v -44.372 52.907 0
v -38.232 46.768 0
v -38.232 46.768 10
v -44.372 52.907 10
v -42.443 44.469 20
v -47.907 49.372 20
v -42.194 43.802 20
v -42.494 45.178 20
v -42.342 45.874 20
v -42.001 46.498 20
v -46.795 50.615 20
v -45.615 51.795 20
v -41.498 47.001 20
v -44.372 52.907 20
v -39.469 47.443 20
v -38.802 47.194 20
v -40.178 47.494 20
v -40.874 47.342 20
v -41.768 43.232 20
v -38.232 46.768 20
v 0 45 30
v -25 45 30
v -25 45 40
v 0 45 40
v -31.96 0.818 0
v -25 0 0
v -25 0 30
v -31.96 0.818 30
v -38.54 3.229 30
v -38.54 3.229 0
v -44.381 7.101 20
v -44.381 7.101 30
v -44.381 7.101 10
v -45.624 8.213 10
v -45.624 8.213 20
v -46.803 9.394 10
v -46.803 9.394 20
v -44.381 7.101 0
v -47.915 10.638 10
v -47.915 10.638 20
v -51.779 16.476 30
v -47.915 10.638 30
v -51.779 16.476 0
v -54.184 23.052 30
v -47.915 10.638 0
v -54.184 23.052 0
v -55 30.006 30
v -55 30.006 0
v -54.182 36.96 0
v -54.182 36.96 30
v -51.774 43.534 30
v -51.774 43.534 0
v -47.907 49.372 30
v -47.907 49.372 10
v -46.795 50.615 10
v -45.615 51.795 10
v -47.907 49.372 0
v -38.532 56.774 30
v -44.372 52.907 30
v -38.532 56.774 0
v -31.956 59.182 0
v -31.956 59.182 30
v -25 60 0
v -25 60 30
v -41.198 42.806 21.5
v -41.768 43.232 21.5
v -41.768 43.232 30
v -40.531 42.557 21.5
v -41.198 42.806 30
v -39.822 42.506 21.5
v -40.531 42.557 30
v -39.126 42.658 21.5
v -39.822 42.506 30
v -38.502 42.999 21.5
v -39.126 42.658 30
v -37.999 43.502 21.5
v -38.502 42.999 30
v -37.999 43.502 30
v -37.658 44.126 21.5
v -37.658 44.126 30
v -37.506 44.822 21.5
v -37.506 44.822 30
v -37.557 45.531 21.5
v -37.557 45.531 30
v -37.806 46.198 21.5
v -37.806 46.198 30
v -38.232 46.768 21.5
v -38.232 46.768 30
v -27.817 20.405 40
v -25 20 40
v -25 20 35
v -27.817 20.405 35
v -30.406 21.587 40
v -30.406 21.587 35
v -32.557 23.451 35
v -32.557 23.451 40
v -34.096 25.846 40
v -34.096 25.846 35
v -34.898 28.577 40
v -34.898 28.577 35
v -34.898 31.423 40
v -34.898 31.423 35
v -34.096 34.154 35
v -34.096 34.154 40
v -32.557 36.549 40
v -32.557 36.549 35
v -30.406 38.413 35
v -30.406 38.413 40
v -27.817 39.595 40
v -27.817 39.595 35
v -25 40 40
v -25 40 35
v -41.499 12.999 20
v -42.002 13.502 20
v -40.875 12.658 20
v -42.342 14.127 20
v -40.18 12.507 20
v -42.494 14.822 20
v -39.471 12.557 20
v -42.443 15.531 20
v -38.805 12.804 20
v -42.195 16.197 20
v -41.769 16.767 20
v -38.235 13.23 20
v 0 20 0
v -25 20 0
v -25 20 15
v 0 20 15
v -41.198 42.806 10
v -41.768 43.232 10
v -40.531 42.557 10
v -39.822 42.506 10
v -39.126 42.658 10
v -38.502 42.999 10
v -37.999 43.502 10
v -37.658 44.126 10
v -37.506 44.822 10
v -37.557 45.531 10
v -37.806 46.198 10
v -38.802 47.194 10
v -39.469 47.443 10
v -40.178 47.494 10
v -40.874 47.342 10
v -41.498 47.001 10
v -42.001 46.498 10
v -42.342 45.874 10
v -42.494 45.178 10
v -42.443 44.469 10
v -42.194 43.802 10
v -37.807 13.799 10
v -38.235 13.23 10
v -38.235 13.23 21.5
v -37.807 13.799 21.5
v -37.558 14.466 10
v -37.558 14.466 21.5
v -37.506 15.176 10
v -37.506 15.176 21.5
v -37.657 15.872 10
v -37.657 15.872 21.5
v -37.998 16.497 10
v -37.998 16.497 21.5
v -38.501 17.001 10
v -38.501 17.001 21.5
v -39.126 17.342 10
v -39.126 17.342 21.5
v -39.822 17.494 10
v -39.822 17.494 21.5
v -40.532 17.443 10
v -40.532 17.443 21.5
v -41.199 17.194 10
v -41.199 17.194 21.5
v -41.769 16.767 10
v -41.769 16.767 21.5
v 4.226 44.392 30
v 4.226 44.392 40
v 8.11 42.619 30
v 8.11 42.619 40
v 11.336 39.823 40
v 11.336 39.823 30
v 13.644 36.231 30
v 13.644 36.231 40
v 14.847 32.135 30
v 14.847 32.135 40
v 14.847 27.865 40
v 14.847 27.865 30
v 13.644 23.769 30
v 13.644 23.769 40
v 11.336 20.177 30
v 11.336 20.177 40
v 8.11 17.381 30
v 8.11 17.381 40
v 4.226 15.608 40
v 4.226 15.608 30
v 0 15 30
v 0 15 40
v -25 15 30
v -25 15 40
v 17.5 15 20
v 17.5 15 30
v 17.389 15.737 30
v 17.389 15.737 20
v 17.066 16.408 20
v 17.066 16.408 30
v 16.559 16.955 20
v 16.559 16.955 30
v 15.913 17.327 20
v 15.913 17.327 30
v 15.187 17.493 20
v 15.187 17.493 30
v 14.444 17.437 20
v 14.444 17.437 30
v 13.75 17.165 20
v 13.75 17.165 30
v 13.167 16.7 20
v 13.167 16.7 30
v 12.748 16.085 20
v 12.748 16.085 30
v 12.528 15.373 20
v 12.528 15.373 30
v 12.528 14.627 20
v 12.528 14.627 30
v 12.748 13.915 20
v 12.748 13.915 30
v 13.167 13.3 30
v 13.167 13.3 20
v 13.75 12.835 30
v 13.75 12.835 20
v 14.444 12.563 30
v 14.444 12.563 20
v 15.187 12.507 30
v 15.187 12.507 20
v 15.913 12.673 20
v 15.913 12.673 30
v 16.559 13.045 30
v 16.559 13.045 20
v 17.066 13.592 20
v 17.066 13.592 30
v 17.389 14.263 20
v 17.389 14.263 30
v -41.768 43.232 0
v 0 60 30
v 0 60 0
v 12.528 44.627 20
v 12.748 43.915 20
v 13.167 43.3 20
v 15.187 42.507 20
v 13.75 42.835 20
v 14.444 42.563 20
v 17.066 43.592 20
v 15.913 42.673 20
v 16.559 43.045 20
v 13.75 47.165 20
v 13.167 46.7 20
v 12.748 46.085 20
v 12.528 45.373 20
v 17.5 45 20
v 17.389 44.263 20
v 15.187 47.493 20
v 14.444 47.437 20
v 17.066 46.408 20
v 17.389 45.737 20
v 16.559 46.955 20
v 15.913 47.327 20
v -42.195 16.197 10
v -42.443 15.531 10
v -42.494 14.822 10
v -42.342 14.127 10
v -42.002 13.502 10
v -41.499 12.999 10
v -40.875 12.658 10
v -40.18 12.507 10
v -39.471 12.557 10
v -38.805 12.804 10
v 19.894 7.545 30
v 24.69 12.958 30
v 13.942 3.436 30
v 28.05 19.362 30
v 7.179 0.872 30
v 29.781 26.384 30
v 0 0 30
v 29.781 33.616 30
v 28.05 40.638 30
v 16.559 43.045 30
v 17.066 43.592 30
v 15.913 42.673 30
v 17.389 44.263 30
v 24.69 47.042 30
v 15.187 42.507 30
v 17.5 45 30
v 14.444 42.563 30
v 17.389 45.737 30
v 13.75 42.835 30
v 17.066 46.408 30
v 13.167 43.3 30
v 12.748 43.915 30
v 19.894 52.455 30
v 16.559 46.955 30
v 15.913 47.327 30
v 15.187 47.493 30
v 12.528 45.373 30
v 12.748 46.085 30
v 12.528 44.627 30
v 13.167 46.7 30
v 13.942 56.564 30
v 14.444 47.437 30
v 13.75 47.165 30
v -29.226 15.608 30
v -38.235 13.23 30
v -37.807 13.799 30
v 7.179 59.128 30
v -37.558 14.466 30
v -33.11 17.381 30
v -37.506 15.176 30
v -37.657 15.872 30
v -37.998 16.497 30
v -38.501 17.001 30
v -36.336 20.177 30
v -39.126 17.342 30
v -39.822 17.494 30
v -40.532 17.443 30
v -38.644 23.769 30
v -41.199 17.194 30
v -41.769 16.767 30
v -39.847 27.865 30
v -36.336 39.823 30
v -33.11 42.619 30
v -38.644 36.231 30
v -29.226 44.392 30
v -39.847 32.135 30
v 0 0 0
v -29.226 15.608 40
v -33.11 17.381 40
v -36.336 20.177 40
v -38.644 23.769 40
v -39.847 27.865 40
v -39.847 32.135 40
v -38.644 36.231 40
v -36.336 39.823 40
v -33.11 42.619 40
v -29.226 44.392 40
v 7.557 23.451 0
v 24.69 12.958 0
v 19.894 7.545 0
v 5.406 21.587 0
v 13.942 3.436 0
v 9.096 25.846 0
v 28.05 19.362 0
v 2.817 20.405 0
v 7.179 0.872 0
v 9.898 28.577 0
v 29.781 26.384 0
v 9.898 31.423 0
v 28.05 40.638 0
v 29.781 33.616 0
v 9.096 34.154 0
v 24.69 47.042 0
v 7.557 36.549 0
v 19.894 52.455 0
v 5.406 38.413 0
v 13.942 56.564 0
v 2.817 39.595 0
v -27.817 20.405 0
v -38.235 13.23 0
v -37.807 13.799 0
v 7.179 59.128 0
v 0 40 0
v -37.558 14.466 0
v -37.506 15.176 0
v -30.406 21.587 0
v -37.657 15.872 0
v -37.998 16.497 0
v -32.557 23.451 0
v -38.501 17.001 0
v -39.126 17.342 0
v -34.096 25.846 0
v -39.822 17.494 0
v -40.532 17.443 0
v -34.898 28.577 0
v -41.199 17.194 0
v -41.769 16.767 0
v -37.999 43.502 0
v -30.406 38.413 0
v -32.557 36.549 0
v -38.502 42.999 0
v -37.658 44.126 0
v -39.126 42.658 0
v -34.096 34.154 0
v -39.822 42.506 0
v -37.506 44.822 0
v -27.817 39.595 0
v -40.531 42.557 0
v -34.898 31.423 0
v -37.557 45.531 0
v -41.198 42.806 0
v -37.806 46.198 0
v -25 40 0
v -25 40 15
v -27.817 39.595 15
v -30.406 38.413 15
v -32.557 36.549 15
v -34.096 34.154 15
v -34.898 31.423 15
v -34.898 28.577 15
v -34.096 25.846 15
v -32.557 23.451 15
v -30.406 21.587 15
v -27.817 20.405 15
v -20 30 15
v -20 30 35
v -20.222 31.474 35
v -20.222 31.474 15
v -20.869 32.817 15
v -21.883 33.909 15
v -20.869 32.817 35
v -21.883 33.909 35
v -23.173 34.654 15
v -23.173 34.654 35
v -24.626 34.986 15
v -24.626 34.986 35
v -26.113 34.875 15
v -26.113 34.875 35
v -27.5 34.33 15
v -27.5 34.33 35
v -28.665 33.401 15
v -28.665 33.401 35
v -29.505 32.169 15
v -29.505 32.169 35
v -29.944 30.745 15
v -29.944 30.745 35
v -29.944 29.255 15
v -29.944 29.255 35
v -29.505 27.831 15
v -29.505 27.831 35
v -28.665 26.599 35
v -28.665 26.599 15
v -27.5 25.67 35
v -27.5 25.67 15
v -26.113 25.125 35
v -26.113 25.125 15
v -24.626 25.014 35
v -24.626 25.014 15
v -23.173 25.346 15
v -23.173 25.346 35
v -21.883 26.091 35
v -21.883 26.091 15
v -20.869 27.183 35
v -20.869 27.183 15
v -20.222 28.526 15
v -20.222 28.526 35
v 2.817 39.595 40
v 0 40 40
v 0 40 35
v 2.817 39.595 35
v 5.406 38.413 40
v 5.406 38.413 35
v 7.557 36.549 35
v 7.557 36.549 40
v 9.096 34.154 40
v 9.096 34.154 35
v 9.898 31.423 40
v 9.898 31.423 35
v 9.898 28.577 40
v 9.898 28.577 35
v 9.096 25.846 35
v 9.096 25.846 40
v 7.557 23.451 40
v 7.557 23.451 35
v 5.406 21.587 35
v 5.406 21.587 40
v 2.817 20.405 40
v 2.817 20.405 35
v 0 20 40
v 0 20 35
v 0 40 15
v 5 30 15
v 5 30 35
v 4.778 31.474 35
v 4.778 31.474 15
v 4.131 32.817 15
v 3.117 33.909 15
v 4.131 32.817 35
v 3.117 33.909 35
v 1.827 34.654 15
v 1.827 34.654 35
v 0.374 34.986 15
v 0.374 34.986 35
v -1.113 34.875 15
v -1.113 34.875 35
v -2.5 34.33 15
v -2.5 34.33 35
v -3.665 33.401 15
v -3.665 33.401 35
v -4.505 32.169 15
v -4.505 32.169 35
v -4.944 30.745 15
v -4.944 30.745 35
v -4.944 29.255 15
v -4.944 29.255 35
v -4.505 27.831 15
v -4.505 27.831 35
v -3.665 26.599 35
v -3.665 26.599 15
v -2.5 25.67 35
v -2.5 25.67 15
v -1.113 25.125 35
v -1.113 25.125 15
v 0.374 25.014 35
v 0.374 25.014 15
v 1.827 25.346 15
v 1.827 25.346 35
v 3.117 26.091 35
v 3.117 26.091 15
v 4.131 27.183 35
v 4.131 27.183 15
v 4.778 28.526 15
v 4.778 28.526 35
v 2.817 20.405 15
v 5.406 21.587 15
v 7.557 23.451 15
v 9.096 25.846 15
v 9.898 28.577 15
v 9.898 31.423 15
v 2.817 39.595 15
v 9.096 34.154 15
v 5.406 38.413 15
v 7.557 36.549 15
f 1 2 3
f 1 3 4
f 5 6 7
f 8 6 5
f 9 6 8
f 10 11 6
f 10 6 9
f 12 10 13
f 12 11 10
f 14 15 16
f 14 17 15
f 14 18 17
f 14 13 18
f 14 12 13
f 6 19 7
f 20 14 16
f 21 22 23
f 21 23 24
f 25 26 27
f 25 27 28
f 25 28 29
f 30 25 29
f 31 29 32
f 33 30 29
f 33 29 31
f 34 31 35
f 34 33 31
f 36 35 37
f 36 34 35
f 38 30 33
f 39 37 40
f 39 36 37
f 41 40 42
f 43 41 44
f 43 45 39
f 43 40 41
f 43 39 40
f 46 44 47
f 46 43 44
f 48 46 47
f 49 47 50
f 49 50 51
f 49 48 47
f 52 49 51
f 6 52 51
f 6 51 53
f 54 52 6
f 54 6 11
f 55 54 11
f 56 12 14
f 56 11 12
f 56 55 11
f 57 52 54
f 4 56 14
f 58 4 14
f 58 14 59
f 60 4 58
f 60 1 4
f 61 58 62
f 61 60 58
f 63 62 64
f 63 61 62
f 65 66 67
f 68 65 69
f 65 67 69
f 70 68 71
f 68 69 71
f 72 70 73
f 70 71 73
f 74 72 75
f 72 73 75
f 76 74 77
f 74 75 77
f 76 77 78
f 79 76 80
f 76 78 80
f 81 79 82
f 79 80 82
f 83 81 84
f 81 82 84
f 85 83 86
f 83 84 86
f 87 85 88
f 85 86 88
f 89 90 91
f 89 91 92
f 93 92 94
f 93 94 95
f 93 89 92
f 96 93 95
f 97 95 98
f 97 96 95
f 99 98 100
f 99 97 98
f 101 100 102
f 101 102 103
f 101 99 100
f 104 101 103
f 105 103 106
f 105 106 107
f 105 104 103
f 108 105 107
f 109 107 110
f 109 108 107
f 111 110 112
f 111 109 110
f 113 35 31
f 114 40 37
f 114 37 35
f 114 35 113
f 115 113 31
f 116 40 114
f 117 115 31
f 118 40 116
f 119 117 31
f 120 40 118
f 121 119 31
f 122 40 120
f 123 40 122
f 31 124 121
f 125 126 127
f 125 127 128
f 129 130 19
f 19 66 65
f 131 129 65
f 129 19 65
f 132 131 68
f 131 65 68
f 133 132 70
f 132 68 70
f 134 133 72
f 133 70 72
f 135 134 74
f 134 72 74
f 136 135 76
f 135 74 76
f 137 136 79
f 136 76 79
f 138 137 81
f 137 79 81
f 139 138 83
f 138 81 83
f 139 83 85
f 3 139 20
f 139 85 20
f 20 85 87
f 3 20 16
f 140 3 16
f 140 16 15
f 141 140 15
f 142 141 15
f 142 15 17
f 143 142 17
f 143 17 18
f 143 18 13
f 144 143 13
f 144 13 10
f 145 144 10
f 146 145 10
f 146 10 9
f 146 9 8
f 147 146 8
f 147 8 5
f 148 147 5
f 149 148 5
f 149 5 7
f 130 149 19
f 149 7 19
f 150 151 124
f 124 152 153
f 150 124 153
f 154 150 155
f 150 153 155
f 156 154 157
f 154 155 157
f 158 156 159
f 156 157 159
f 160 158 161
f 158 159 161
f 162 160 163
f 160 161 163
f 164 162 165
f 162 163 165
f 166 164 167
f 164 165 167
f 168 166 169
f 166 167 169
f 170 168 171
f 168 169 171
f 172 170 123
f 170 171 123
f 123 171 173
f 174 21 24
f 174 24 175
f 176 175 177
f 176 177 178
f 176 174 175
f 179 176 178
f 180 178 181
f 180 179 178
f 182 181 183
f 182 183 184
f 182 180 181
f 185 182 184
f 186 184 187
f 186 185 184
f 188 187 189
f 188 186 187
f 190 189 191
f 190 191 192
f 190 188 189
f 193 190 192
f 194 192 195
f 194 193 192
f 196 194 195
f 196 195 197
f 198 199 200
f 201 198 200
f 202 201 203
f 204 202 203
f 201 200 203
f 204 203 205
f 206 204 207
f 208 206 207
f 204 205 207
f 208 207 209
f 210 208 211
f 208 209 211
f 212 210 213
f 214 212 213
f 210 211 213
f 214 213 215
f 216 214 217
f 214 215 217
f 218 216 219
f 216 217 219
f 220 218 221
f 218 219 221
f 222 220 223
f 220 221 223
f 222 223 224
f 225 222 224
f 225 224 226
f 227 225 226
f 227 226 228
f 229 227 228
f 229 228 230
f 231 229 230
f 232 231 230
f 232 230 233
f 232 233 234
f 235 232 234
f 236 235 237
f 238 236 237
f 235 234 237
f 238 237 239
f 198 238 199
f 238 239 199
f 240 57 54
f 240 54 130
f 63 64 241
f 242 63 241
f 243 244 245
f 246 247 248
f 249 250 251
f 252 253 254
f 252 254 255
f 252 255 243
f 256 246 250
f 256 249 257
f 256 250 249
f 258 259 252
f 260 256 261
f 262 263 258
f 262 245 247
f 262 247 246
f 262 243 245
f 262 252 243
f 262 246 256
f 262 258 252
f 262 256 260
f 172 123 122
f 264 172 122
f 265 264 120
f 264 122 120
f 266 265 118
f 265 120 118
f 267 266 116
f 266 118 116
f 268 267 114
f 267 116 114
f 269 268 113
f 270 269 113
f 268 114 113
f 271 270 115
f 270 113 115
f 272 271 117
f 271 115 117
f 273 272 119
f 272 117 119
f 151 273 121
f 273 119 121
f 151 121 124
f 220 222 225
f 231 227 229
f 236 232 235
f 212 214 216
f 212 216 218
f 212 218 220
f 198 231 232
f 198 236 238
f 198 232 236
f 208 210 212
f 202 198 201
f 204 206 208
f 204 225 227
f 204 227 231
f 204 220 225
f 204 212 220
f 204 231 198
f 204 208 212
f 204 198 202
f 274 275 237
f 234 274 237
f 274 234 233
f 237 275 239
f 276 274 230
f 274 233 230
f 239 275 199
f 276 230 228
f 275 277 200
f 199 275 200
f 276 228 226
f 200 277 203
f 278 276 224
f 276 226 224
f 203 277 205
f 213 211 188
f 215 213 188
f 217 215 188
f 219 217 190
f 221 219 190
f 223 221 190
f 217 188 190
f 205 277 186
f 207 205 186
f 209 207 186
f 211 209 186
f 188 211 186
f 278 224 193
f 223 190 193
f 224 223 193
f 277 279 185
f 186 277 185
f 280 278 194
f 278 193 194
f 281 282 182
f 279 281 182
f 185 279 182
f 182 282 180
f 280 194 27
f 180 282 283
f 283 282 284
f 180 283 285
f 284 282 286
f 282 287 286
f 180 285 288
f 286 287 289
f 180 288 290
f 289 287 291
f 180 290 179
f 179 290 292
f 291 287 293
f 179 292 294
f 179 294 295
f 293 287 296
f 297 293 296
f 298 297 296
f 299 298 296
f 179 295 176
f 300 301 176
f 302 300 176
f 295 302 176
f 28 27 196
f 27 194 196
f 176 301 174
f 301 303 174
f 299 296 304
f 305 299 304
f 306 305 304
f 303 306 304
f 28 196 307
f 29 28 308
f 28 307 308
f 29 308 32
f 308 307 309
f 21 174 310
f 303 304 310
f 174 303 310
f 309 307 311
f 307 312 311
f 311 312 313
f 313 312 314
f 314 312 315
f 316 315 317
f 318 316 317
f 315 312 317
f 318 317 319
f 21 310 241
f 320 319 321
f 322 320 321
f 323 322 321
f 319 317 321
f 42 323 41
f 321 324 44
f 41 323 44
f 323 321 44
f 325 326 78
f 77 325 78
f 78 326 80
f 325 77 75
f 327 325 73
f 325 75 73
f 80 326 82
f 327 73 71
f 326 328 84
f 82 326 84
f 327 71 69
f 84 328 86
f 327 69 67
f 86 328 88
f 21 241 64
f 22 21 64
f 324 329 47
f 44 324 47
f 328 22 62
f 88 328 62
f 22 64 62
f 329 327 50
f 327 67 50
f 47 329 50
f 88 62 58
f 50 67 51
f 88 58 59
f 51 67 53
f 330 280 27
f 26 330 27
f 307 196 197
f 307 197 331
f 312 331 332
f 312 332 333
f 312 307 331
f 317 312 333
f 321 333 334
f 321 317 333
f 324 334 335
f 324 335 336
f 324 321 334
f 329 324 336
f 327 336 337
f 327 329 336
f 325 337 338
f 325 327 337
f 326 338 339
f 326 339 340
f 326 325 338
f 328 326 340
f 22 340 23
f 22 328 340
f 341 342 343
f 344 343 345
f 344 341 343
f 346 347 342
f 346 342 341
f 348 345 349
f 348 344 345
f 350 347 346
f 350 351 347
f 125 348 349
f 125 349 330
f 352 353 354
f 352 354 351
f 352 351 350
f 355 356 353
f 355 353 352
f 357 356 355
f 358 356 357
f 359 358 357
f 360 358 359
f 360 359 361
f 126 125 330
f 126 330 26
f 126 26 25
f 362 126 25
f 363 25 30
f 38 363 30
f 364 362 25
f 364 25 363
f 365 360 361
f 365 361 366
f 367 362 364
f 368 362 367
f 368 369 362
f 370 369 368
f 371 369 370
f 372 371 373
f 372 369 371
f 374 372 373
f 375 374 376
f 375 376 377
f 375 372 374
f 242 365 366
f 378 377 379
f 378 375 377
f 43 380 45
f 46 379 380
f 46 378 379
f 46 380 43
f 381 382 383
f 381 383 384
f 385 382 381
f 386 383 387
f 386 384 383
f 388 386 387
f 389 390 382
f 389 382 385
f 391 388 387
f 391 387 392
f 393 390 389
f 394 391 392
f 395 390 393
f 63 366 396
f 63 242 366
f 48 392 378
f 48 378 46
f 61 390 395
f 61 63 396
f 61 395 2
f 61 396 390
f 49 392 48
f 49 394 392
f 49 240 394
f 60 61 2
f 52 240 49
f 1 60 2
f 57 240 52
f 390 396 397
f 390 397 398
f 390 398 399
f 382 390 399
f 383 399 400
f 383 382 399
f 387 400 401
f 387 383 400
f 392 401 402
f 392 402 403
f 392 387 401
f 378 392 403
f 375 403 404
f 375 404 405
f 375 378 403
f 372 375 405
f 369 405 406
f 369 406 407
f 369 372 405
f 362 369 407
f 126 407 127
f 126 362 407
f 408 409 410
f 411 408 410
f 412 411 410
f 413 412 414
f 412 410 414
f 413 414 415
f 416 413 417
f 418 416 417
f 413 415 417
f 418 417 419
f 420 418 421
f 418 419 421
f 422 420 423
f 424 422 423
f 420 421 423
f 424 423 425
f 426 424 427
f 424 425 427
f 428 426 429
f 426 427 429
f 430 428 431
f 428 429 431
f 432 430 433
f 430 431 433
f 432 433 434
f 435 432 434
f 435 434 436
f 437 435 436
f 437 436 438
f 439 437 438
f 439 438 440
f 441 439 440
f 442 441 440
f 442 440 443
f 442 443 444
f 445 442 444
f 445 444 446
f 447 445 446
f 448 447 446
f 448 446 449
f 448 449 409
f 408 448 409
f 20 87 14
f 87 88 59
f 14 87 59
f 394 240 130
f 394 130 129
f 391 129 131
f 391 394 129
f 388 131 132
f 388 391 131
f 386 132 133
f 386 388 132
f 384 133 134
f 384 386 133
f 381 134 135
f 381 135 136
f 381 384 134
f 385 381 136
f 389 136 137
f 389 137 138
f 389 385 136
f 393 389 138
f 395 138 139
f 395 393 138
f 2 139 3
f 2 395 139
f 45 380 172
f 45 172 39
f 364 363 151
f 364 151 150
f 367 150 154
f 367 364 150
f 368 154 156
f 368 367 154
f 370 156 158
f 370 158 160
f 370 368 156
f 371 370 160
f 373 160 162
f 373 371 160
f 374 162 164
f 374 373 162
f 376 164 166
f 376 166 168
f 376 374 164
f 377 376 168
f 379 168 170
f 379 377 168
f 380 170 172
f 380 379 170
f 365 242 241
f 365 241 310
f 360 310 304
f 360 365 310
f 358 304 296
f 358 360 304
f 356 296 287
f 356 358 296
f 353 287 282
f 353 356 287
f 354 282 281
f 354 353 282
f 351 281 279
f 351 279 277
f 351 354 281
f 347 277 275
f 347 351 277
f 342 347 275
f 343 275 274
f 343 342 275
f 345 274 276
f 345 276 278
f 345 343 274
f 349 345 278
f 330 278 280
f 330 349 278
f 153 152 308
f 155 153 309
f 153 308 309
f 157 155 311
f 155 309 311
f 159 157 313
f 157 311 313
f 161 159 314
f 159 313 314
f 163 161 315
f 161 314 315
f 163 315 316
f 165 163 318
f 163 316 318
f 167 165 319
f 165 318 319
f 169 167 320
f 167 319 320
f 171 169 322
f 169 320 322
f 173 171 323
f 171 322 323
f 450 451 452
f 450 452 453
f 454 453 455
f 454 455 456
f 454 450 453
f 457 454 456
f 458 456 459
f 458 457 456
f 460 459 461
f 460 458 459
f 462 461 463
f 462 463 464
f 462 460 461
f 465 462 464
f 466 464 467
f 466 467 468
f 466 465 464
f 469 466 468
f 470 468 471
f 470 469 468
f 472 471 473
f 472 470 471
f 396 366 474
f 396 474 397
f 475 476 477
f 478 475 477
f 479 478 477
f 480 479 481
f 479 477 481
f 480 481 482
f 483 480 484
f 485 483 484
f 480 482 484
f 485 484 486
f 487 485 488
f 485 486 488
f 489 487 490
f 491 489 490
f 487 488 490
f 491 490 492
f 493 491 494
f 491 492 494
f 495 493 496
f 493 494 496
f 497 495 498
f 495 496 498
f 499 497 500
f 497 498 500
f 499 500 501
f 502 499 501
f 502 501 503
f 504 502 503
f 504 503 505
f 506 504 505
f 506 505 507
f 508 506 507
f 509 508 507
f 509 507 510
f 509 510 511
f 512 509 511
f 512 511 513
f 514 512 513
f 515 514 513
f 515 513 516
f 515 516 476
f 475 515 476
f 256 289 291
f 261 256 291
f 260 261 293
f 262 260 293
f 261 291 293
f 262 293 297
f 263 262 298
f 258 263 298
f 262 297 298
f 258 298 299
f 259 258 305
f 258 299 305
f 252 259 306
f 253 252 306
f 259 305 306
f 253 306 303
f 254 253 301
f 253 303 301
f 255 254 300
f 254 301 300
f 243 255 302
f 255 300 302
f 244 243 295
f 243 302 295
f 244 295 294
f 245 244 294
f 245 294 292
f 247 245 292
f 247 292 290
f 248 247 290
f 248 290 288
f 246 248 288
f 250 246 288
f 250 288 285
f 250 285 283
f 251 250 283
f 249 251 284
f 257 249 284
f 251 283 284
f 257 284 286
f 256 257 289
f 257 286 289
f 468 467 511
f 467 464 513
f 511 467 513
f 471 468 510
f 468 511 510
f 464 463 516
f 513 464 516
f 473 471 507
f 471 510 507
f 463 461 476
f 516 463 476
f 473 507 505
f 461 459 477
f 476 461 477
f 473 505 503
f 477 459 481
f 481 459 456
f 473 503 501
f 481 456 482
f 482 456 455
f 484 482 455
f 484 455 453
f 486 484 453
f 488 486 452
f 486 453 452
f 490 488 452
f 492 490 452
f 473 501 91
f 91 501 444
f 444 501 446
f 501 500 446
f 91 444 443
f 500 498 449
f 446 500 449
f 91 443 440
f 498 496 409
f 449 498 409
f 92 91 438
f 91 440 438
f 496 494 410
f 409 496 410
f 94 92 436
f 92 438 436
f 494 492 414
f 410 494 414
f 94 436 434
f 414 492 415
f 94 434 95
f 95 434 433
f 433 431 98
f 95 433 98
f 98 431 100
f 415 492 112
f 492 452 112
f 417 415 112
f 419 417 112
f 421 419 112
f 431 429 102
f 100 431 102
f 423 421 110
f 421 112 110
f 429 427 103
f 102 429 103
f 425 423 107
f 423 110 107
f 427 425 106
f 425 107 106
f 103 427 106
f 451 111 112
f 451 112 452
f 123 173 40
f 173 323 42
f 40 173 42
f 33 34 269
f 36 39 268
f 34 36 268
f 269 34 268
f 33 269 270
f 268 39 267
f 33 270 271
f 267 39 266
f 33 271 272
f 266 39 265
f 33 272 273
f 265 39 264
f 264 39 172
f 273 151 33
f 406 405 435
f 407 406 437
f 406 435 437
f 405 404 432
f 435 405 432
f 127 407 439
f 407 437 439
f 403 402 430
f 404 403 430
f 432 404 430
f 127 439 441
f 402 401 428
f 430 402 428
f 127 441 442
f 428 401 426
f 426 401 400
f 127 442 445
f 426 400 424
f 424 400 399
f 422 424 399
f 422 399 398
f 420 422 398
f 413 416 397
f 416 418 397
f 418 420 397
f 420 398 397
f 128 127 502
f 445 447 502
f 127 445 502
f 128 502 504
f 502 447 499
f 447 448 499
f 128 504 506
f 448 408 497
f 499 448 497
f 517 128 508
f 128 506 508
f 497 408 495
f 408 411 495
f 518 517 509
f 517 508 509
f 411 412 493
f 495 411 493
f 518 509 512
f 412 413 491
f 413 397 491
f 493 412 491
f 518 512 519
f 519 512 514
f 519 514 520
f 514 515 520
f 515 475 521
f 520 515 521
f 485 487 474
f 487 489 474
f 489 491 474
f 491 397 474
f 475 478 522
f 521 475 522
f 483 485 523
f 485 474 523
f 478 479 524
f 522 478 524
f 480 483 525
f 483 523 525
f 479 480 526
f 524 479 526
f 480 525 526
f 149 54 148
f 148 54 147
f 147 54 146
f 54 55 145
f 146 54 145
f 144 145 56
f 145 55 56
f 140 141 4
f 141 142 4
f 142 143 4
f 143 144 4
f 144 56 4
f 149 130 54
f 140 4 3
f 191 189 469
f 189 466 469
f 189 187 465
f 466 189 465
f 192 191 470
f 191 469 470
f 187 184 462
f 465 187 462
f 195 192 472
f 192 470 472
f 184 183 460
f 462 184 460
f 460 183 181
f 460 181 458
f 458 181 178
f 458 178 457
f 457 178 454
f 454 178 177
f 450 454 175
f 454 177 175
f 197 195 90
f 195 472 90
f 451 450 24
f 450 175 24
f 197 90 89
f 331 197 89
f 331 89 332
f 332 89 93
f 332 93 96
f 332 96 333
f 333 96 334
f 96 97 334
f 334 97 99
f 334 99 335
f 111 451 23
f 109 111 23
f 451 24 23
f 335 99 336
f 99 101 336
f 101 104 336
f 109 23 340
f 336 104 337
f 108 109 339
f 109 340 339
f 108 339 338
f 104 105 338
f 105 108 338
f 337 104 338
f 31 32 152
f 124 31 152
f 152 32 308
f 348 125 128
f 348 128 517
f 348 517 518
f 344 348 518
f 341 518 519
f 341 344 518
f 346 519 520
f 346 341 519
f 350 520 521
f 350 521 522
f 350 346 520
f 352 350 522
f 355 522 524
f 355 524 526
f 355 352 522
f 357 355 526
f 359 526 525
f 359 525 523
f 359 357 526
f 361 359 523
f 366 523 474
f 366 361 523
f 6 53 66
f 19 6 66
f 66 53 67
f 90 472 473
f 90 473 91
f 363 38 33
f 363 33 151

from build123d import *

# Parameters (mm, degrees)
BOSS_EXTRUDE3_DEPTH = 30
BOSS_EXTRUDE4_DEPTH = 10
CUT_EXTRUDE1_DEPTH  = 5
SKETCH5_R           = 5
CUT_EXTRUDE2_DEPTH  = 122
SKETCH6_R           = 2.5
CUT_EXTRUDE4_DEPTH  = 10
CUT_EXTRUDE9_DEPTH  = 10
SKETCH9_R           = 2.5
BOSS_EXTRUDE5_DEPTH = 1.5
CUT_EXTRUDE10_DEPTH = 30
CUT_EXTRUDE11_DEPTH = 15


with BuildPart() as part:
    # Sketch1 → Boss-Extrude3 (new body)
    with BuildSketch(Plane.XY):
        with BuildLine():
            Line((0, 0), (-25, 0))
            ThreePointArc((-25, 0), (-55, 30), (-25, 60))
            Line((-25, 60), (0, 60))
            ThreePointArc((0, 60), (30, 30), (0, 0))
        make_face()
    extrude(amount=BOSS_EXTRUDE3_DEPTH)

    # Sketch3 → Boss-Extrude4 (add)
    with BuildSketch(Plane.XY.offset(30)):
        with BuildLine():
            Line((-25, 45), (0, 45))
            ThreePointArc((0, 45), (15, 30), (0, 15))
            Line((0, 15), (-25, 15))
            ThreePointArc((-25, 15), (-40, 30), (-25, 45))
        make_face()
    extrude(amount=BOSS_EXTRUDE4_DEPTH)

    # Sketch4 → Cut-Extrude1 (cut)
    with BuildSketch(Plane.XY.offset(40)):
        with BuildLine():
            Line((-25, 40), (0, 40))
            ThreePointArc((0, 40), (10, 30), (0, 20))
            Line((0, 20), (-25, 20))
            ThreePointArc((-25, 20), (-35, 30), (-25, 40))
        make_face()
    extrude(amount=-CUT_EXTRUDE1_DEPTH, mode=Mode.SUBTRACT)

    # Sketch5 → Cut-Extrude2 (cut)
    with BuildSketch(Plane.XY.offset(35)):
        with Locations((-25, 30)):
            Circle(SKETCH5_R)
        with Locations((0, 30)):
            Circle(SKETCH5_R)
    extrude(amount=-CUT_EXTRUDE2_DEPTH, mode=Mode.SUBTRACT)

    # Sketch6 → Cut-Extrude4 (cut)
    with BuildSketch(Plane.XY.offset(30)):
        with Locations((15, 45)):
            Circle(SKETCH6_R)
        with Locations((15, 15)):
            Circle(SKETCH6_R)
    extrude(amount=-CUT_EXTRUDE4_DEPTH, mode=Mode.SUBTRACT)

    # Sketch7 → Cut-Extrude9 (cut)
    with BuildSketch(Plane.XY.offset(30)):
        with BuildLine():
            Line((-47.90718511, 49.371651204), (-41.767766953, 43.232233047))
            ThreePointArc((-41.767766953, 43.232233047), (-38.232233047, 43.232233047), (-38.232233047, 46.767766953))
            Line((-38.232233047, 46.767766953), (-44.371651204, 52.90718511))
            ThreePointArc((-44.371651204, 52.90718511), (-46.213203436, 51.213203436), (-47.90718511, 49.371651204))
        make_face()
        with BuildLine():
            Line((-41.768792046, 16.766741265), (-47.914964434, 10.637551678))
            ThreePointArc((-47.914964434, 10.637551678), (-46.221723462, 8.795320015), (-44.380852806, 7.100599473))
            Line((-44.380852806, 7.100599473), (-38.234680419, 13.229789059))
            ThreePointArc((-38.234680419, 13.229789059), (-38.231523045, 16.767056665), (-41.768792046, 16.766741265))
        make_face()
    cut_extrude9 = extrude(amount=-CUT_EXTRUDE9_DEPTH, mode=Mode.SUBTRACT)

    # Sketch9 → Boss-Extrude5 (add)
    with BuildSketch(Plane.XY.offset(20)):
        with Locations((-40, 45)):
            Circle(SKETCH9_R)
        with Locations((-40, 15)):
            Circle(SKETCH9_R)
    extrude(amount=BOSS_EXTRUDE5_DEPTH)

    # Mirror1: Cut-Extrude9 across plane
    add(cut_extrude9.mirror(Plane.XY.offset(15)), mode=Mode.SUBTRACT)

    # Sketch10 → Cut-Extrude10 (cut)
    with BuildSketch(Plane.XY.offset(21.5)):
        with BuildLine():
            ThreePointArc((-38.232233047, 46.767766953), (-41.767766953, 46.767766953), (-41.767766953, 43.232233047))
            ThreePointArc((-41.767766953, 43.232233047), (-38.232233047, 43.232233047), (-38.232233047, 46.767766953))
        make_face()
        with BuildLine():
            ThreePointArc((-41.768792046, 16.766741265), (-41.768476955, 13.232943335), (-38.234680419, 13.229789059))
            ThreePointArc((-38.234680419, 13.229789059), (-38.231523045, 16.767056665), (-41.768792046, 16.766741265))
        make_face()
    extrude(amount=-CUT_EXTRUDE10_DEPTH, mode=Mode.SUBTRACT)

    # Sketch11 → Cut-Extrude11 (cut)
    with BuildSketch(Plane(origin=(0, 0, 0), x_dir=(-1, 0, 0), z_dir=(0, 0, -1))):
        with BuildLine():
            Line((0, 40), (25, 40))
            ThreePointArc((25, 40), (35, 30), (25, 20))
            Line((25, 20), (0, 20))
            ThreePointArc((0, 20), (-10, 30), (0, 40))
        make_face()
    extrude(amount=-CUT_EXTRUDE11_DEPTH, mode=Mode.SUBTRACT)


solid = part.part
